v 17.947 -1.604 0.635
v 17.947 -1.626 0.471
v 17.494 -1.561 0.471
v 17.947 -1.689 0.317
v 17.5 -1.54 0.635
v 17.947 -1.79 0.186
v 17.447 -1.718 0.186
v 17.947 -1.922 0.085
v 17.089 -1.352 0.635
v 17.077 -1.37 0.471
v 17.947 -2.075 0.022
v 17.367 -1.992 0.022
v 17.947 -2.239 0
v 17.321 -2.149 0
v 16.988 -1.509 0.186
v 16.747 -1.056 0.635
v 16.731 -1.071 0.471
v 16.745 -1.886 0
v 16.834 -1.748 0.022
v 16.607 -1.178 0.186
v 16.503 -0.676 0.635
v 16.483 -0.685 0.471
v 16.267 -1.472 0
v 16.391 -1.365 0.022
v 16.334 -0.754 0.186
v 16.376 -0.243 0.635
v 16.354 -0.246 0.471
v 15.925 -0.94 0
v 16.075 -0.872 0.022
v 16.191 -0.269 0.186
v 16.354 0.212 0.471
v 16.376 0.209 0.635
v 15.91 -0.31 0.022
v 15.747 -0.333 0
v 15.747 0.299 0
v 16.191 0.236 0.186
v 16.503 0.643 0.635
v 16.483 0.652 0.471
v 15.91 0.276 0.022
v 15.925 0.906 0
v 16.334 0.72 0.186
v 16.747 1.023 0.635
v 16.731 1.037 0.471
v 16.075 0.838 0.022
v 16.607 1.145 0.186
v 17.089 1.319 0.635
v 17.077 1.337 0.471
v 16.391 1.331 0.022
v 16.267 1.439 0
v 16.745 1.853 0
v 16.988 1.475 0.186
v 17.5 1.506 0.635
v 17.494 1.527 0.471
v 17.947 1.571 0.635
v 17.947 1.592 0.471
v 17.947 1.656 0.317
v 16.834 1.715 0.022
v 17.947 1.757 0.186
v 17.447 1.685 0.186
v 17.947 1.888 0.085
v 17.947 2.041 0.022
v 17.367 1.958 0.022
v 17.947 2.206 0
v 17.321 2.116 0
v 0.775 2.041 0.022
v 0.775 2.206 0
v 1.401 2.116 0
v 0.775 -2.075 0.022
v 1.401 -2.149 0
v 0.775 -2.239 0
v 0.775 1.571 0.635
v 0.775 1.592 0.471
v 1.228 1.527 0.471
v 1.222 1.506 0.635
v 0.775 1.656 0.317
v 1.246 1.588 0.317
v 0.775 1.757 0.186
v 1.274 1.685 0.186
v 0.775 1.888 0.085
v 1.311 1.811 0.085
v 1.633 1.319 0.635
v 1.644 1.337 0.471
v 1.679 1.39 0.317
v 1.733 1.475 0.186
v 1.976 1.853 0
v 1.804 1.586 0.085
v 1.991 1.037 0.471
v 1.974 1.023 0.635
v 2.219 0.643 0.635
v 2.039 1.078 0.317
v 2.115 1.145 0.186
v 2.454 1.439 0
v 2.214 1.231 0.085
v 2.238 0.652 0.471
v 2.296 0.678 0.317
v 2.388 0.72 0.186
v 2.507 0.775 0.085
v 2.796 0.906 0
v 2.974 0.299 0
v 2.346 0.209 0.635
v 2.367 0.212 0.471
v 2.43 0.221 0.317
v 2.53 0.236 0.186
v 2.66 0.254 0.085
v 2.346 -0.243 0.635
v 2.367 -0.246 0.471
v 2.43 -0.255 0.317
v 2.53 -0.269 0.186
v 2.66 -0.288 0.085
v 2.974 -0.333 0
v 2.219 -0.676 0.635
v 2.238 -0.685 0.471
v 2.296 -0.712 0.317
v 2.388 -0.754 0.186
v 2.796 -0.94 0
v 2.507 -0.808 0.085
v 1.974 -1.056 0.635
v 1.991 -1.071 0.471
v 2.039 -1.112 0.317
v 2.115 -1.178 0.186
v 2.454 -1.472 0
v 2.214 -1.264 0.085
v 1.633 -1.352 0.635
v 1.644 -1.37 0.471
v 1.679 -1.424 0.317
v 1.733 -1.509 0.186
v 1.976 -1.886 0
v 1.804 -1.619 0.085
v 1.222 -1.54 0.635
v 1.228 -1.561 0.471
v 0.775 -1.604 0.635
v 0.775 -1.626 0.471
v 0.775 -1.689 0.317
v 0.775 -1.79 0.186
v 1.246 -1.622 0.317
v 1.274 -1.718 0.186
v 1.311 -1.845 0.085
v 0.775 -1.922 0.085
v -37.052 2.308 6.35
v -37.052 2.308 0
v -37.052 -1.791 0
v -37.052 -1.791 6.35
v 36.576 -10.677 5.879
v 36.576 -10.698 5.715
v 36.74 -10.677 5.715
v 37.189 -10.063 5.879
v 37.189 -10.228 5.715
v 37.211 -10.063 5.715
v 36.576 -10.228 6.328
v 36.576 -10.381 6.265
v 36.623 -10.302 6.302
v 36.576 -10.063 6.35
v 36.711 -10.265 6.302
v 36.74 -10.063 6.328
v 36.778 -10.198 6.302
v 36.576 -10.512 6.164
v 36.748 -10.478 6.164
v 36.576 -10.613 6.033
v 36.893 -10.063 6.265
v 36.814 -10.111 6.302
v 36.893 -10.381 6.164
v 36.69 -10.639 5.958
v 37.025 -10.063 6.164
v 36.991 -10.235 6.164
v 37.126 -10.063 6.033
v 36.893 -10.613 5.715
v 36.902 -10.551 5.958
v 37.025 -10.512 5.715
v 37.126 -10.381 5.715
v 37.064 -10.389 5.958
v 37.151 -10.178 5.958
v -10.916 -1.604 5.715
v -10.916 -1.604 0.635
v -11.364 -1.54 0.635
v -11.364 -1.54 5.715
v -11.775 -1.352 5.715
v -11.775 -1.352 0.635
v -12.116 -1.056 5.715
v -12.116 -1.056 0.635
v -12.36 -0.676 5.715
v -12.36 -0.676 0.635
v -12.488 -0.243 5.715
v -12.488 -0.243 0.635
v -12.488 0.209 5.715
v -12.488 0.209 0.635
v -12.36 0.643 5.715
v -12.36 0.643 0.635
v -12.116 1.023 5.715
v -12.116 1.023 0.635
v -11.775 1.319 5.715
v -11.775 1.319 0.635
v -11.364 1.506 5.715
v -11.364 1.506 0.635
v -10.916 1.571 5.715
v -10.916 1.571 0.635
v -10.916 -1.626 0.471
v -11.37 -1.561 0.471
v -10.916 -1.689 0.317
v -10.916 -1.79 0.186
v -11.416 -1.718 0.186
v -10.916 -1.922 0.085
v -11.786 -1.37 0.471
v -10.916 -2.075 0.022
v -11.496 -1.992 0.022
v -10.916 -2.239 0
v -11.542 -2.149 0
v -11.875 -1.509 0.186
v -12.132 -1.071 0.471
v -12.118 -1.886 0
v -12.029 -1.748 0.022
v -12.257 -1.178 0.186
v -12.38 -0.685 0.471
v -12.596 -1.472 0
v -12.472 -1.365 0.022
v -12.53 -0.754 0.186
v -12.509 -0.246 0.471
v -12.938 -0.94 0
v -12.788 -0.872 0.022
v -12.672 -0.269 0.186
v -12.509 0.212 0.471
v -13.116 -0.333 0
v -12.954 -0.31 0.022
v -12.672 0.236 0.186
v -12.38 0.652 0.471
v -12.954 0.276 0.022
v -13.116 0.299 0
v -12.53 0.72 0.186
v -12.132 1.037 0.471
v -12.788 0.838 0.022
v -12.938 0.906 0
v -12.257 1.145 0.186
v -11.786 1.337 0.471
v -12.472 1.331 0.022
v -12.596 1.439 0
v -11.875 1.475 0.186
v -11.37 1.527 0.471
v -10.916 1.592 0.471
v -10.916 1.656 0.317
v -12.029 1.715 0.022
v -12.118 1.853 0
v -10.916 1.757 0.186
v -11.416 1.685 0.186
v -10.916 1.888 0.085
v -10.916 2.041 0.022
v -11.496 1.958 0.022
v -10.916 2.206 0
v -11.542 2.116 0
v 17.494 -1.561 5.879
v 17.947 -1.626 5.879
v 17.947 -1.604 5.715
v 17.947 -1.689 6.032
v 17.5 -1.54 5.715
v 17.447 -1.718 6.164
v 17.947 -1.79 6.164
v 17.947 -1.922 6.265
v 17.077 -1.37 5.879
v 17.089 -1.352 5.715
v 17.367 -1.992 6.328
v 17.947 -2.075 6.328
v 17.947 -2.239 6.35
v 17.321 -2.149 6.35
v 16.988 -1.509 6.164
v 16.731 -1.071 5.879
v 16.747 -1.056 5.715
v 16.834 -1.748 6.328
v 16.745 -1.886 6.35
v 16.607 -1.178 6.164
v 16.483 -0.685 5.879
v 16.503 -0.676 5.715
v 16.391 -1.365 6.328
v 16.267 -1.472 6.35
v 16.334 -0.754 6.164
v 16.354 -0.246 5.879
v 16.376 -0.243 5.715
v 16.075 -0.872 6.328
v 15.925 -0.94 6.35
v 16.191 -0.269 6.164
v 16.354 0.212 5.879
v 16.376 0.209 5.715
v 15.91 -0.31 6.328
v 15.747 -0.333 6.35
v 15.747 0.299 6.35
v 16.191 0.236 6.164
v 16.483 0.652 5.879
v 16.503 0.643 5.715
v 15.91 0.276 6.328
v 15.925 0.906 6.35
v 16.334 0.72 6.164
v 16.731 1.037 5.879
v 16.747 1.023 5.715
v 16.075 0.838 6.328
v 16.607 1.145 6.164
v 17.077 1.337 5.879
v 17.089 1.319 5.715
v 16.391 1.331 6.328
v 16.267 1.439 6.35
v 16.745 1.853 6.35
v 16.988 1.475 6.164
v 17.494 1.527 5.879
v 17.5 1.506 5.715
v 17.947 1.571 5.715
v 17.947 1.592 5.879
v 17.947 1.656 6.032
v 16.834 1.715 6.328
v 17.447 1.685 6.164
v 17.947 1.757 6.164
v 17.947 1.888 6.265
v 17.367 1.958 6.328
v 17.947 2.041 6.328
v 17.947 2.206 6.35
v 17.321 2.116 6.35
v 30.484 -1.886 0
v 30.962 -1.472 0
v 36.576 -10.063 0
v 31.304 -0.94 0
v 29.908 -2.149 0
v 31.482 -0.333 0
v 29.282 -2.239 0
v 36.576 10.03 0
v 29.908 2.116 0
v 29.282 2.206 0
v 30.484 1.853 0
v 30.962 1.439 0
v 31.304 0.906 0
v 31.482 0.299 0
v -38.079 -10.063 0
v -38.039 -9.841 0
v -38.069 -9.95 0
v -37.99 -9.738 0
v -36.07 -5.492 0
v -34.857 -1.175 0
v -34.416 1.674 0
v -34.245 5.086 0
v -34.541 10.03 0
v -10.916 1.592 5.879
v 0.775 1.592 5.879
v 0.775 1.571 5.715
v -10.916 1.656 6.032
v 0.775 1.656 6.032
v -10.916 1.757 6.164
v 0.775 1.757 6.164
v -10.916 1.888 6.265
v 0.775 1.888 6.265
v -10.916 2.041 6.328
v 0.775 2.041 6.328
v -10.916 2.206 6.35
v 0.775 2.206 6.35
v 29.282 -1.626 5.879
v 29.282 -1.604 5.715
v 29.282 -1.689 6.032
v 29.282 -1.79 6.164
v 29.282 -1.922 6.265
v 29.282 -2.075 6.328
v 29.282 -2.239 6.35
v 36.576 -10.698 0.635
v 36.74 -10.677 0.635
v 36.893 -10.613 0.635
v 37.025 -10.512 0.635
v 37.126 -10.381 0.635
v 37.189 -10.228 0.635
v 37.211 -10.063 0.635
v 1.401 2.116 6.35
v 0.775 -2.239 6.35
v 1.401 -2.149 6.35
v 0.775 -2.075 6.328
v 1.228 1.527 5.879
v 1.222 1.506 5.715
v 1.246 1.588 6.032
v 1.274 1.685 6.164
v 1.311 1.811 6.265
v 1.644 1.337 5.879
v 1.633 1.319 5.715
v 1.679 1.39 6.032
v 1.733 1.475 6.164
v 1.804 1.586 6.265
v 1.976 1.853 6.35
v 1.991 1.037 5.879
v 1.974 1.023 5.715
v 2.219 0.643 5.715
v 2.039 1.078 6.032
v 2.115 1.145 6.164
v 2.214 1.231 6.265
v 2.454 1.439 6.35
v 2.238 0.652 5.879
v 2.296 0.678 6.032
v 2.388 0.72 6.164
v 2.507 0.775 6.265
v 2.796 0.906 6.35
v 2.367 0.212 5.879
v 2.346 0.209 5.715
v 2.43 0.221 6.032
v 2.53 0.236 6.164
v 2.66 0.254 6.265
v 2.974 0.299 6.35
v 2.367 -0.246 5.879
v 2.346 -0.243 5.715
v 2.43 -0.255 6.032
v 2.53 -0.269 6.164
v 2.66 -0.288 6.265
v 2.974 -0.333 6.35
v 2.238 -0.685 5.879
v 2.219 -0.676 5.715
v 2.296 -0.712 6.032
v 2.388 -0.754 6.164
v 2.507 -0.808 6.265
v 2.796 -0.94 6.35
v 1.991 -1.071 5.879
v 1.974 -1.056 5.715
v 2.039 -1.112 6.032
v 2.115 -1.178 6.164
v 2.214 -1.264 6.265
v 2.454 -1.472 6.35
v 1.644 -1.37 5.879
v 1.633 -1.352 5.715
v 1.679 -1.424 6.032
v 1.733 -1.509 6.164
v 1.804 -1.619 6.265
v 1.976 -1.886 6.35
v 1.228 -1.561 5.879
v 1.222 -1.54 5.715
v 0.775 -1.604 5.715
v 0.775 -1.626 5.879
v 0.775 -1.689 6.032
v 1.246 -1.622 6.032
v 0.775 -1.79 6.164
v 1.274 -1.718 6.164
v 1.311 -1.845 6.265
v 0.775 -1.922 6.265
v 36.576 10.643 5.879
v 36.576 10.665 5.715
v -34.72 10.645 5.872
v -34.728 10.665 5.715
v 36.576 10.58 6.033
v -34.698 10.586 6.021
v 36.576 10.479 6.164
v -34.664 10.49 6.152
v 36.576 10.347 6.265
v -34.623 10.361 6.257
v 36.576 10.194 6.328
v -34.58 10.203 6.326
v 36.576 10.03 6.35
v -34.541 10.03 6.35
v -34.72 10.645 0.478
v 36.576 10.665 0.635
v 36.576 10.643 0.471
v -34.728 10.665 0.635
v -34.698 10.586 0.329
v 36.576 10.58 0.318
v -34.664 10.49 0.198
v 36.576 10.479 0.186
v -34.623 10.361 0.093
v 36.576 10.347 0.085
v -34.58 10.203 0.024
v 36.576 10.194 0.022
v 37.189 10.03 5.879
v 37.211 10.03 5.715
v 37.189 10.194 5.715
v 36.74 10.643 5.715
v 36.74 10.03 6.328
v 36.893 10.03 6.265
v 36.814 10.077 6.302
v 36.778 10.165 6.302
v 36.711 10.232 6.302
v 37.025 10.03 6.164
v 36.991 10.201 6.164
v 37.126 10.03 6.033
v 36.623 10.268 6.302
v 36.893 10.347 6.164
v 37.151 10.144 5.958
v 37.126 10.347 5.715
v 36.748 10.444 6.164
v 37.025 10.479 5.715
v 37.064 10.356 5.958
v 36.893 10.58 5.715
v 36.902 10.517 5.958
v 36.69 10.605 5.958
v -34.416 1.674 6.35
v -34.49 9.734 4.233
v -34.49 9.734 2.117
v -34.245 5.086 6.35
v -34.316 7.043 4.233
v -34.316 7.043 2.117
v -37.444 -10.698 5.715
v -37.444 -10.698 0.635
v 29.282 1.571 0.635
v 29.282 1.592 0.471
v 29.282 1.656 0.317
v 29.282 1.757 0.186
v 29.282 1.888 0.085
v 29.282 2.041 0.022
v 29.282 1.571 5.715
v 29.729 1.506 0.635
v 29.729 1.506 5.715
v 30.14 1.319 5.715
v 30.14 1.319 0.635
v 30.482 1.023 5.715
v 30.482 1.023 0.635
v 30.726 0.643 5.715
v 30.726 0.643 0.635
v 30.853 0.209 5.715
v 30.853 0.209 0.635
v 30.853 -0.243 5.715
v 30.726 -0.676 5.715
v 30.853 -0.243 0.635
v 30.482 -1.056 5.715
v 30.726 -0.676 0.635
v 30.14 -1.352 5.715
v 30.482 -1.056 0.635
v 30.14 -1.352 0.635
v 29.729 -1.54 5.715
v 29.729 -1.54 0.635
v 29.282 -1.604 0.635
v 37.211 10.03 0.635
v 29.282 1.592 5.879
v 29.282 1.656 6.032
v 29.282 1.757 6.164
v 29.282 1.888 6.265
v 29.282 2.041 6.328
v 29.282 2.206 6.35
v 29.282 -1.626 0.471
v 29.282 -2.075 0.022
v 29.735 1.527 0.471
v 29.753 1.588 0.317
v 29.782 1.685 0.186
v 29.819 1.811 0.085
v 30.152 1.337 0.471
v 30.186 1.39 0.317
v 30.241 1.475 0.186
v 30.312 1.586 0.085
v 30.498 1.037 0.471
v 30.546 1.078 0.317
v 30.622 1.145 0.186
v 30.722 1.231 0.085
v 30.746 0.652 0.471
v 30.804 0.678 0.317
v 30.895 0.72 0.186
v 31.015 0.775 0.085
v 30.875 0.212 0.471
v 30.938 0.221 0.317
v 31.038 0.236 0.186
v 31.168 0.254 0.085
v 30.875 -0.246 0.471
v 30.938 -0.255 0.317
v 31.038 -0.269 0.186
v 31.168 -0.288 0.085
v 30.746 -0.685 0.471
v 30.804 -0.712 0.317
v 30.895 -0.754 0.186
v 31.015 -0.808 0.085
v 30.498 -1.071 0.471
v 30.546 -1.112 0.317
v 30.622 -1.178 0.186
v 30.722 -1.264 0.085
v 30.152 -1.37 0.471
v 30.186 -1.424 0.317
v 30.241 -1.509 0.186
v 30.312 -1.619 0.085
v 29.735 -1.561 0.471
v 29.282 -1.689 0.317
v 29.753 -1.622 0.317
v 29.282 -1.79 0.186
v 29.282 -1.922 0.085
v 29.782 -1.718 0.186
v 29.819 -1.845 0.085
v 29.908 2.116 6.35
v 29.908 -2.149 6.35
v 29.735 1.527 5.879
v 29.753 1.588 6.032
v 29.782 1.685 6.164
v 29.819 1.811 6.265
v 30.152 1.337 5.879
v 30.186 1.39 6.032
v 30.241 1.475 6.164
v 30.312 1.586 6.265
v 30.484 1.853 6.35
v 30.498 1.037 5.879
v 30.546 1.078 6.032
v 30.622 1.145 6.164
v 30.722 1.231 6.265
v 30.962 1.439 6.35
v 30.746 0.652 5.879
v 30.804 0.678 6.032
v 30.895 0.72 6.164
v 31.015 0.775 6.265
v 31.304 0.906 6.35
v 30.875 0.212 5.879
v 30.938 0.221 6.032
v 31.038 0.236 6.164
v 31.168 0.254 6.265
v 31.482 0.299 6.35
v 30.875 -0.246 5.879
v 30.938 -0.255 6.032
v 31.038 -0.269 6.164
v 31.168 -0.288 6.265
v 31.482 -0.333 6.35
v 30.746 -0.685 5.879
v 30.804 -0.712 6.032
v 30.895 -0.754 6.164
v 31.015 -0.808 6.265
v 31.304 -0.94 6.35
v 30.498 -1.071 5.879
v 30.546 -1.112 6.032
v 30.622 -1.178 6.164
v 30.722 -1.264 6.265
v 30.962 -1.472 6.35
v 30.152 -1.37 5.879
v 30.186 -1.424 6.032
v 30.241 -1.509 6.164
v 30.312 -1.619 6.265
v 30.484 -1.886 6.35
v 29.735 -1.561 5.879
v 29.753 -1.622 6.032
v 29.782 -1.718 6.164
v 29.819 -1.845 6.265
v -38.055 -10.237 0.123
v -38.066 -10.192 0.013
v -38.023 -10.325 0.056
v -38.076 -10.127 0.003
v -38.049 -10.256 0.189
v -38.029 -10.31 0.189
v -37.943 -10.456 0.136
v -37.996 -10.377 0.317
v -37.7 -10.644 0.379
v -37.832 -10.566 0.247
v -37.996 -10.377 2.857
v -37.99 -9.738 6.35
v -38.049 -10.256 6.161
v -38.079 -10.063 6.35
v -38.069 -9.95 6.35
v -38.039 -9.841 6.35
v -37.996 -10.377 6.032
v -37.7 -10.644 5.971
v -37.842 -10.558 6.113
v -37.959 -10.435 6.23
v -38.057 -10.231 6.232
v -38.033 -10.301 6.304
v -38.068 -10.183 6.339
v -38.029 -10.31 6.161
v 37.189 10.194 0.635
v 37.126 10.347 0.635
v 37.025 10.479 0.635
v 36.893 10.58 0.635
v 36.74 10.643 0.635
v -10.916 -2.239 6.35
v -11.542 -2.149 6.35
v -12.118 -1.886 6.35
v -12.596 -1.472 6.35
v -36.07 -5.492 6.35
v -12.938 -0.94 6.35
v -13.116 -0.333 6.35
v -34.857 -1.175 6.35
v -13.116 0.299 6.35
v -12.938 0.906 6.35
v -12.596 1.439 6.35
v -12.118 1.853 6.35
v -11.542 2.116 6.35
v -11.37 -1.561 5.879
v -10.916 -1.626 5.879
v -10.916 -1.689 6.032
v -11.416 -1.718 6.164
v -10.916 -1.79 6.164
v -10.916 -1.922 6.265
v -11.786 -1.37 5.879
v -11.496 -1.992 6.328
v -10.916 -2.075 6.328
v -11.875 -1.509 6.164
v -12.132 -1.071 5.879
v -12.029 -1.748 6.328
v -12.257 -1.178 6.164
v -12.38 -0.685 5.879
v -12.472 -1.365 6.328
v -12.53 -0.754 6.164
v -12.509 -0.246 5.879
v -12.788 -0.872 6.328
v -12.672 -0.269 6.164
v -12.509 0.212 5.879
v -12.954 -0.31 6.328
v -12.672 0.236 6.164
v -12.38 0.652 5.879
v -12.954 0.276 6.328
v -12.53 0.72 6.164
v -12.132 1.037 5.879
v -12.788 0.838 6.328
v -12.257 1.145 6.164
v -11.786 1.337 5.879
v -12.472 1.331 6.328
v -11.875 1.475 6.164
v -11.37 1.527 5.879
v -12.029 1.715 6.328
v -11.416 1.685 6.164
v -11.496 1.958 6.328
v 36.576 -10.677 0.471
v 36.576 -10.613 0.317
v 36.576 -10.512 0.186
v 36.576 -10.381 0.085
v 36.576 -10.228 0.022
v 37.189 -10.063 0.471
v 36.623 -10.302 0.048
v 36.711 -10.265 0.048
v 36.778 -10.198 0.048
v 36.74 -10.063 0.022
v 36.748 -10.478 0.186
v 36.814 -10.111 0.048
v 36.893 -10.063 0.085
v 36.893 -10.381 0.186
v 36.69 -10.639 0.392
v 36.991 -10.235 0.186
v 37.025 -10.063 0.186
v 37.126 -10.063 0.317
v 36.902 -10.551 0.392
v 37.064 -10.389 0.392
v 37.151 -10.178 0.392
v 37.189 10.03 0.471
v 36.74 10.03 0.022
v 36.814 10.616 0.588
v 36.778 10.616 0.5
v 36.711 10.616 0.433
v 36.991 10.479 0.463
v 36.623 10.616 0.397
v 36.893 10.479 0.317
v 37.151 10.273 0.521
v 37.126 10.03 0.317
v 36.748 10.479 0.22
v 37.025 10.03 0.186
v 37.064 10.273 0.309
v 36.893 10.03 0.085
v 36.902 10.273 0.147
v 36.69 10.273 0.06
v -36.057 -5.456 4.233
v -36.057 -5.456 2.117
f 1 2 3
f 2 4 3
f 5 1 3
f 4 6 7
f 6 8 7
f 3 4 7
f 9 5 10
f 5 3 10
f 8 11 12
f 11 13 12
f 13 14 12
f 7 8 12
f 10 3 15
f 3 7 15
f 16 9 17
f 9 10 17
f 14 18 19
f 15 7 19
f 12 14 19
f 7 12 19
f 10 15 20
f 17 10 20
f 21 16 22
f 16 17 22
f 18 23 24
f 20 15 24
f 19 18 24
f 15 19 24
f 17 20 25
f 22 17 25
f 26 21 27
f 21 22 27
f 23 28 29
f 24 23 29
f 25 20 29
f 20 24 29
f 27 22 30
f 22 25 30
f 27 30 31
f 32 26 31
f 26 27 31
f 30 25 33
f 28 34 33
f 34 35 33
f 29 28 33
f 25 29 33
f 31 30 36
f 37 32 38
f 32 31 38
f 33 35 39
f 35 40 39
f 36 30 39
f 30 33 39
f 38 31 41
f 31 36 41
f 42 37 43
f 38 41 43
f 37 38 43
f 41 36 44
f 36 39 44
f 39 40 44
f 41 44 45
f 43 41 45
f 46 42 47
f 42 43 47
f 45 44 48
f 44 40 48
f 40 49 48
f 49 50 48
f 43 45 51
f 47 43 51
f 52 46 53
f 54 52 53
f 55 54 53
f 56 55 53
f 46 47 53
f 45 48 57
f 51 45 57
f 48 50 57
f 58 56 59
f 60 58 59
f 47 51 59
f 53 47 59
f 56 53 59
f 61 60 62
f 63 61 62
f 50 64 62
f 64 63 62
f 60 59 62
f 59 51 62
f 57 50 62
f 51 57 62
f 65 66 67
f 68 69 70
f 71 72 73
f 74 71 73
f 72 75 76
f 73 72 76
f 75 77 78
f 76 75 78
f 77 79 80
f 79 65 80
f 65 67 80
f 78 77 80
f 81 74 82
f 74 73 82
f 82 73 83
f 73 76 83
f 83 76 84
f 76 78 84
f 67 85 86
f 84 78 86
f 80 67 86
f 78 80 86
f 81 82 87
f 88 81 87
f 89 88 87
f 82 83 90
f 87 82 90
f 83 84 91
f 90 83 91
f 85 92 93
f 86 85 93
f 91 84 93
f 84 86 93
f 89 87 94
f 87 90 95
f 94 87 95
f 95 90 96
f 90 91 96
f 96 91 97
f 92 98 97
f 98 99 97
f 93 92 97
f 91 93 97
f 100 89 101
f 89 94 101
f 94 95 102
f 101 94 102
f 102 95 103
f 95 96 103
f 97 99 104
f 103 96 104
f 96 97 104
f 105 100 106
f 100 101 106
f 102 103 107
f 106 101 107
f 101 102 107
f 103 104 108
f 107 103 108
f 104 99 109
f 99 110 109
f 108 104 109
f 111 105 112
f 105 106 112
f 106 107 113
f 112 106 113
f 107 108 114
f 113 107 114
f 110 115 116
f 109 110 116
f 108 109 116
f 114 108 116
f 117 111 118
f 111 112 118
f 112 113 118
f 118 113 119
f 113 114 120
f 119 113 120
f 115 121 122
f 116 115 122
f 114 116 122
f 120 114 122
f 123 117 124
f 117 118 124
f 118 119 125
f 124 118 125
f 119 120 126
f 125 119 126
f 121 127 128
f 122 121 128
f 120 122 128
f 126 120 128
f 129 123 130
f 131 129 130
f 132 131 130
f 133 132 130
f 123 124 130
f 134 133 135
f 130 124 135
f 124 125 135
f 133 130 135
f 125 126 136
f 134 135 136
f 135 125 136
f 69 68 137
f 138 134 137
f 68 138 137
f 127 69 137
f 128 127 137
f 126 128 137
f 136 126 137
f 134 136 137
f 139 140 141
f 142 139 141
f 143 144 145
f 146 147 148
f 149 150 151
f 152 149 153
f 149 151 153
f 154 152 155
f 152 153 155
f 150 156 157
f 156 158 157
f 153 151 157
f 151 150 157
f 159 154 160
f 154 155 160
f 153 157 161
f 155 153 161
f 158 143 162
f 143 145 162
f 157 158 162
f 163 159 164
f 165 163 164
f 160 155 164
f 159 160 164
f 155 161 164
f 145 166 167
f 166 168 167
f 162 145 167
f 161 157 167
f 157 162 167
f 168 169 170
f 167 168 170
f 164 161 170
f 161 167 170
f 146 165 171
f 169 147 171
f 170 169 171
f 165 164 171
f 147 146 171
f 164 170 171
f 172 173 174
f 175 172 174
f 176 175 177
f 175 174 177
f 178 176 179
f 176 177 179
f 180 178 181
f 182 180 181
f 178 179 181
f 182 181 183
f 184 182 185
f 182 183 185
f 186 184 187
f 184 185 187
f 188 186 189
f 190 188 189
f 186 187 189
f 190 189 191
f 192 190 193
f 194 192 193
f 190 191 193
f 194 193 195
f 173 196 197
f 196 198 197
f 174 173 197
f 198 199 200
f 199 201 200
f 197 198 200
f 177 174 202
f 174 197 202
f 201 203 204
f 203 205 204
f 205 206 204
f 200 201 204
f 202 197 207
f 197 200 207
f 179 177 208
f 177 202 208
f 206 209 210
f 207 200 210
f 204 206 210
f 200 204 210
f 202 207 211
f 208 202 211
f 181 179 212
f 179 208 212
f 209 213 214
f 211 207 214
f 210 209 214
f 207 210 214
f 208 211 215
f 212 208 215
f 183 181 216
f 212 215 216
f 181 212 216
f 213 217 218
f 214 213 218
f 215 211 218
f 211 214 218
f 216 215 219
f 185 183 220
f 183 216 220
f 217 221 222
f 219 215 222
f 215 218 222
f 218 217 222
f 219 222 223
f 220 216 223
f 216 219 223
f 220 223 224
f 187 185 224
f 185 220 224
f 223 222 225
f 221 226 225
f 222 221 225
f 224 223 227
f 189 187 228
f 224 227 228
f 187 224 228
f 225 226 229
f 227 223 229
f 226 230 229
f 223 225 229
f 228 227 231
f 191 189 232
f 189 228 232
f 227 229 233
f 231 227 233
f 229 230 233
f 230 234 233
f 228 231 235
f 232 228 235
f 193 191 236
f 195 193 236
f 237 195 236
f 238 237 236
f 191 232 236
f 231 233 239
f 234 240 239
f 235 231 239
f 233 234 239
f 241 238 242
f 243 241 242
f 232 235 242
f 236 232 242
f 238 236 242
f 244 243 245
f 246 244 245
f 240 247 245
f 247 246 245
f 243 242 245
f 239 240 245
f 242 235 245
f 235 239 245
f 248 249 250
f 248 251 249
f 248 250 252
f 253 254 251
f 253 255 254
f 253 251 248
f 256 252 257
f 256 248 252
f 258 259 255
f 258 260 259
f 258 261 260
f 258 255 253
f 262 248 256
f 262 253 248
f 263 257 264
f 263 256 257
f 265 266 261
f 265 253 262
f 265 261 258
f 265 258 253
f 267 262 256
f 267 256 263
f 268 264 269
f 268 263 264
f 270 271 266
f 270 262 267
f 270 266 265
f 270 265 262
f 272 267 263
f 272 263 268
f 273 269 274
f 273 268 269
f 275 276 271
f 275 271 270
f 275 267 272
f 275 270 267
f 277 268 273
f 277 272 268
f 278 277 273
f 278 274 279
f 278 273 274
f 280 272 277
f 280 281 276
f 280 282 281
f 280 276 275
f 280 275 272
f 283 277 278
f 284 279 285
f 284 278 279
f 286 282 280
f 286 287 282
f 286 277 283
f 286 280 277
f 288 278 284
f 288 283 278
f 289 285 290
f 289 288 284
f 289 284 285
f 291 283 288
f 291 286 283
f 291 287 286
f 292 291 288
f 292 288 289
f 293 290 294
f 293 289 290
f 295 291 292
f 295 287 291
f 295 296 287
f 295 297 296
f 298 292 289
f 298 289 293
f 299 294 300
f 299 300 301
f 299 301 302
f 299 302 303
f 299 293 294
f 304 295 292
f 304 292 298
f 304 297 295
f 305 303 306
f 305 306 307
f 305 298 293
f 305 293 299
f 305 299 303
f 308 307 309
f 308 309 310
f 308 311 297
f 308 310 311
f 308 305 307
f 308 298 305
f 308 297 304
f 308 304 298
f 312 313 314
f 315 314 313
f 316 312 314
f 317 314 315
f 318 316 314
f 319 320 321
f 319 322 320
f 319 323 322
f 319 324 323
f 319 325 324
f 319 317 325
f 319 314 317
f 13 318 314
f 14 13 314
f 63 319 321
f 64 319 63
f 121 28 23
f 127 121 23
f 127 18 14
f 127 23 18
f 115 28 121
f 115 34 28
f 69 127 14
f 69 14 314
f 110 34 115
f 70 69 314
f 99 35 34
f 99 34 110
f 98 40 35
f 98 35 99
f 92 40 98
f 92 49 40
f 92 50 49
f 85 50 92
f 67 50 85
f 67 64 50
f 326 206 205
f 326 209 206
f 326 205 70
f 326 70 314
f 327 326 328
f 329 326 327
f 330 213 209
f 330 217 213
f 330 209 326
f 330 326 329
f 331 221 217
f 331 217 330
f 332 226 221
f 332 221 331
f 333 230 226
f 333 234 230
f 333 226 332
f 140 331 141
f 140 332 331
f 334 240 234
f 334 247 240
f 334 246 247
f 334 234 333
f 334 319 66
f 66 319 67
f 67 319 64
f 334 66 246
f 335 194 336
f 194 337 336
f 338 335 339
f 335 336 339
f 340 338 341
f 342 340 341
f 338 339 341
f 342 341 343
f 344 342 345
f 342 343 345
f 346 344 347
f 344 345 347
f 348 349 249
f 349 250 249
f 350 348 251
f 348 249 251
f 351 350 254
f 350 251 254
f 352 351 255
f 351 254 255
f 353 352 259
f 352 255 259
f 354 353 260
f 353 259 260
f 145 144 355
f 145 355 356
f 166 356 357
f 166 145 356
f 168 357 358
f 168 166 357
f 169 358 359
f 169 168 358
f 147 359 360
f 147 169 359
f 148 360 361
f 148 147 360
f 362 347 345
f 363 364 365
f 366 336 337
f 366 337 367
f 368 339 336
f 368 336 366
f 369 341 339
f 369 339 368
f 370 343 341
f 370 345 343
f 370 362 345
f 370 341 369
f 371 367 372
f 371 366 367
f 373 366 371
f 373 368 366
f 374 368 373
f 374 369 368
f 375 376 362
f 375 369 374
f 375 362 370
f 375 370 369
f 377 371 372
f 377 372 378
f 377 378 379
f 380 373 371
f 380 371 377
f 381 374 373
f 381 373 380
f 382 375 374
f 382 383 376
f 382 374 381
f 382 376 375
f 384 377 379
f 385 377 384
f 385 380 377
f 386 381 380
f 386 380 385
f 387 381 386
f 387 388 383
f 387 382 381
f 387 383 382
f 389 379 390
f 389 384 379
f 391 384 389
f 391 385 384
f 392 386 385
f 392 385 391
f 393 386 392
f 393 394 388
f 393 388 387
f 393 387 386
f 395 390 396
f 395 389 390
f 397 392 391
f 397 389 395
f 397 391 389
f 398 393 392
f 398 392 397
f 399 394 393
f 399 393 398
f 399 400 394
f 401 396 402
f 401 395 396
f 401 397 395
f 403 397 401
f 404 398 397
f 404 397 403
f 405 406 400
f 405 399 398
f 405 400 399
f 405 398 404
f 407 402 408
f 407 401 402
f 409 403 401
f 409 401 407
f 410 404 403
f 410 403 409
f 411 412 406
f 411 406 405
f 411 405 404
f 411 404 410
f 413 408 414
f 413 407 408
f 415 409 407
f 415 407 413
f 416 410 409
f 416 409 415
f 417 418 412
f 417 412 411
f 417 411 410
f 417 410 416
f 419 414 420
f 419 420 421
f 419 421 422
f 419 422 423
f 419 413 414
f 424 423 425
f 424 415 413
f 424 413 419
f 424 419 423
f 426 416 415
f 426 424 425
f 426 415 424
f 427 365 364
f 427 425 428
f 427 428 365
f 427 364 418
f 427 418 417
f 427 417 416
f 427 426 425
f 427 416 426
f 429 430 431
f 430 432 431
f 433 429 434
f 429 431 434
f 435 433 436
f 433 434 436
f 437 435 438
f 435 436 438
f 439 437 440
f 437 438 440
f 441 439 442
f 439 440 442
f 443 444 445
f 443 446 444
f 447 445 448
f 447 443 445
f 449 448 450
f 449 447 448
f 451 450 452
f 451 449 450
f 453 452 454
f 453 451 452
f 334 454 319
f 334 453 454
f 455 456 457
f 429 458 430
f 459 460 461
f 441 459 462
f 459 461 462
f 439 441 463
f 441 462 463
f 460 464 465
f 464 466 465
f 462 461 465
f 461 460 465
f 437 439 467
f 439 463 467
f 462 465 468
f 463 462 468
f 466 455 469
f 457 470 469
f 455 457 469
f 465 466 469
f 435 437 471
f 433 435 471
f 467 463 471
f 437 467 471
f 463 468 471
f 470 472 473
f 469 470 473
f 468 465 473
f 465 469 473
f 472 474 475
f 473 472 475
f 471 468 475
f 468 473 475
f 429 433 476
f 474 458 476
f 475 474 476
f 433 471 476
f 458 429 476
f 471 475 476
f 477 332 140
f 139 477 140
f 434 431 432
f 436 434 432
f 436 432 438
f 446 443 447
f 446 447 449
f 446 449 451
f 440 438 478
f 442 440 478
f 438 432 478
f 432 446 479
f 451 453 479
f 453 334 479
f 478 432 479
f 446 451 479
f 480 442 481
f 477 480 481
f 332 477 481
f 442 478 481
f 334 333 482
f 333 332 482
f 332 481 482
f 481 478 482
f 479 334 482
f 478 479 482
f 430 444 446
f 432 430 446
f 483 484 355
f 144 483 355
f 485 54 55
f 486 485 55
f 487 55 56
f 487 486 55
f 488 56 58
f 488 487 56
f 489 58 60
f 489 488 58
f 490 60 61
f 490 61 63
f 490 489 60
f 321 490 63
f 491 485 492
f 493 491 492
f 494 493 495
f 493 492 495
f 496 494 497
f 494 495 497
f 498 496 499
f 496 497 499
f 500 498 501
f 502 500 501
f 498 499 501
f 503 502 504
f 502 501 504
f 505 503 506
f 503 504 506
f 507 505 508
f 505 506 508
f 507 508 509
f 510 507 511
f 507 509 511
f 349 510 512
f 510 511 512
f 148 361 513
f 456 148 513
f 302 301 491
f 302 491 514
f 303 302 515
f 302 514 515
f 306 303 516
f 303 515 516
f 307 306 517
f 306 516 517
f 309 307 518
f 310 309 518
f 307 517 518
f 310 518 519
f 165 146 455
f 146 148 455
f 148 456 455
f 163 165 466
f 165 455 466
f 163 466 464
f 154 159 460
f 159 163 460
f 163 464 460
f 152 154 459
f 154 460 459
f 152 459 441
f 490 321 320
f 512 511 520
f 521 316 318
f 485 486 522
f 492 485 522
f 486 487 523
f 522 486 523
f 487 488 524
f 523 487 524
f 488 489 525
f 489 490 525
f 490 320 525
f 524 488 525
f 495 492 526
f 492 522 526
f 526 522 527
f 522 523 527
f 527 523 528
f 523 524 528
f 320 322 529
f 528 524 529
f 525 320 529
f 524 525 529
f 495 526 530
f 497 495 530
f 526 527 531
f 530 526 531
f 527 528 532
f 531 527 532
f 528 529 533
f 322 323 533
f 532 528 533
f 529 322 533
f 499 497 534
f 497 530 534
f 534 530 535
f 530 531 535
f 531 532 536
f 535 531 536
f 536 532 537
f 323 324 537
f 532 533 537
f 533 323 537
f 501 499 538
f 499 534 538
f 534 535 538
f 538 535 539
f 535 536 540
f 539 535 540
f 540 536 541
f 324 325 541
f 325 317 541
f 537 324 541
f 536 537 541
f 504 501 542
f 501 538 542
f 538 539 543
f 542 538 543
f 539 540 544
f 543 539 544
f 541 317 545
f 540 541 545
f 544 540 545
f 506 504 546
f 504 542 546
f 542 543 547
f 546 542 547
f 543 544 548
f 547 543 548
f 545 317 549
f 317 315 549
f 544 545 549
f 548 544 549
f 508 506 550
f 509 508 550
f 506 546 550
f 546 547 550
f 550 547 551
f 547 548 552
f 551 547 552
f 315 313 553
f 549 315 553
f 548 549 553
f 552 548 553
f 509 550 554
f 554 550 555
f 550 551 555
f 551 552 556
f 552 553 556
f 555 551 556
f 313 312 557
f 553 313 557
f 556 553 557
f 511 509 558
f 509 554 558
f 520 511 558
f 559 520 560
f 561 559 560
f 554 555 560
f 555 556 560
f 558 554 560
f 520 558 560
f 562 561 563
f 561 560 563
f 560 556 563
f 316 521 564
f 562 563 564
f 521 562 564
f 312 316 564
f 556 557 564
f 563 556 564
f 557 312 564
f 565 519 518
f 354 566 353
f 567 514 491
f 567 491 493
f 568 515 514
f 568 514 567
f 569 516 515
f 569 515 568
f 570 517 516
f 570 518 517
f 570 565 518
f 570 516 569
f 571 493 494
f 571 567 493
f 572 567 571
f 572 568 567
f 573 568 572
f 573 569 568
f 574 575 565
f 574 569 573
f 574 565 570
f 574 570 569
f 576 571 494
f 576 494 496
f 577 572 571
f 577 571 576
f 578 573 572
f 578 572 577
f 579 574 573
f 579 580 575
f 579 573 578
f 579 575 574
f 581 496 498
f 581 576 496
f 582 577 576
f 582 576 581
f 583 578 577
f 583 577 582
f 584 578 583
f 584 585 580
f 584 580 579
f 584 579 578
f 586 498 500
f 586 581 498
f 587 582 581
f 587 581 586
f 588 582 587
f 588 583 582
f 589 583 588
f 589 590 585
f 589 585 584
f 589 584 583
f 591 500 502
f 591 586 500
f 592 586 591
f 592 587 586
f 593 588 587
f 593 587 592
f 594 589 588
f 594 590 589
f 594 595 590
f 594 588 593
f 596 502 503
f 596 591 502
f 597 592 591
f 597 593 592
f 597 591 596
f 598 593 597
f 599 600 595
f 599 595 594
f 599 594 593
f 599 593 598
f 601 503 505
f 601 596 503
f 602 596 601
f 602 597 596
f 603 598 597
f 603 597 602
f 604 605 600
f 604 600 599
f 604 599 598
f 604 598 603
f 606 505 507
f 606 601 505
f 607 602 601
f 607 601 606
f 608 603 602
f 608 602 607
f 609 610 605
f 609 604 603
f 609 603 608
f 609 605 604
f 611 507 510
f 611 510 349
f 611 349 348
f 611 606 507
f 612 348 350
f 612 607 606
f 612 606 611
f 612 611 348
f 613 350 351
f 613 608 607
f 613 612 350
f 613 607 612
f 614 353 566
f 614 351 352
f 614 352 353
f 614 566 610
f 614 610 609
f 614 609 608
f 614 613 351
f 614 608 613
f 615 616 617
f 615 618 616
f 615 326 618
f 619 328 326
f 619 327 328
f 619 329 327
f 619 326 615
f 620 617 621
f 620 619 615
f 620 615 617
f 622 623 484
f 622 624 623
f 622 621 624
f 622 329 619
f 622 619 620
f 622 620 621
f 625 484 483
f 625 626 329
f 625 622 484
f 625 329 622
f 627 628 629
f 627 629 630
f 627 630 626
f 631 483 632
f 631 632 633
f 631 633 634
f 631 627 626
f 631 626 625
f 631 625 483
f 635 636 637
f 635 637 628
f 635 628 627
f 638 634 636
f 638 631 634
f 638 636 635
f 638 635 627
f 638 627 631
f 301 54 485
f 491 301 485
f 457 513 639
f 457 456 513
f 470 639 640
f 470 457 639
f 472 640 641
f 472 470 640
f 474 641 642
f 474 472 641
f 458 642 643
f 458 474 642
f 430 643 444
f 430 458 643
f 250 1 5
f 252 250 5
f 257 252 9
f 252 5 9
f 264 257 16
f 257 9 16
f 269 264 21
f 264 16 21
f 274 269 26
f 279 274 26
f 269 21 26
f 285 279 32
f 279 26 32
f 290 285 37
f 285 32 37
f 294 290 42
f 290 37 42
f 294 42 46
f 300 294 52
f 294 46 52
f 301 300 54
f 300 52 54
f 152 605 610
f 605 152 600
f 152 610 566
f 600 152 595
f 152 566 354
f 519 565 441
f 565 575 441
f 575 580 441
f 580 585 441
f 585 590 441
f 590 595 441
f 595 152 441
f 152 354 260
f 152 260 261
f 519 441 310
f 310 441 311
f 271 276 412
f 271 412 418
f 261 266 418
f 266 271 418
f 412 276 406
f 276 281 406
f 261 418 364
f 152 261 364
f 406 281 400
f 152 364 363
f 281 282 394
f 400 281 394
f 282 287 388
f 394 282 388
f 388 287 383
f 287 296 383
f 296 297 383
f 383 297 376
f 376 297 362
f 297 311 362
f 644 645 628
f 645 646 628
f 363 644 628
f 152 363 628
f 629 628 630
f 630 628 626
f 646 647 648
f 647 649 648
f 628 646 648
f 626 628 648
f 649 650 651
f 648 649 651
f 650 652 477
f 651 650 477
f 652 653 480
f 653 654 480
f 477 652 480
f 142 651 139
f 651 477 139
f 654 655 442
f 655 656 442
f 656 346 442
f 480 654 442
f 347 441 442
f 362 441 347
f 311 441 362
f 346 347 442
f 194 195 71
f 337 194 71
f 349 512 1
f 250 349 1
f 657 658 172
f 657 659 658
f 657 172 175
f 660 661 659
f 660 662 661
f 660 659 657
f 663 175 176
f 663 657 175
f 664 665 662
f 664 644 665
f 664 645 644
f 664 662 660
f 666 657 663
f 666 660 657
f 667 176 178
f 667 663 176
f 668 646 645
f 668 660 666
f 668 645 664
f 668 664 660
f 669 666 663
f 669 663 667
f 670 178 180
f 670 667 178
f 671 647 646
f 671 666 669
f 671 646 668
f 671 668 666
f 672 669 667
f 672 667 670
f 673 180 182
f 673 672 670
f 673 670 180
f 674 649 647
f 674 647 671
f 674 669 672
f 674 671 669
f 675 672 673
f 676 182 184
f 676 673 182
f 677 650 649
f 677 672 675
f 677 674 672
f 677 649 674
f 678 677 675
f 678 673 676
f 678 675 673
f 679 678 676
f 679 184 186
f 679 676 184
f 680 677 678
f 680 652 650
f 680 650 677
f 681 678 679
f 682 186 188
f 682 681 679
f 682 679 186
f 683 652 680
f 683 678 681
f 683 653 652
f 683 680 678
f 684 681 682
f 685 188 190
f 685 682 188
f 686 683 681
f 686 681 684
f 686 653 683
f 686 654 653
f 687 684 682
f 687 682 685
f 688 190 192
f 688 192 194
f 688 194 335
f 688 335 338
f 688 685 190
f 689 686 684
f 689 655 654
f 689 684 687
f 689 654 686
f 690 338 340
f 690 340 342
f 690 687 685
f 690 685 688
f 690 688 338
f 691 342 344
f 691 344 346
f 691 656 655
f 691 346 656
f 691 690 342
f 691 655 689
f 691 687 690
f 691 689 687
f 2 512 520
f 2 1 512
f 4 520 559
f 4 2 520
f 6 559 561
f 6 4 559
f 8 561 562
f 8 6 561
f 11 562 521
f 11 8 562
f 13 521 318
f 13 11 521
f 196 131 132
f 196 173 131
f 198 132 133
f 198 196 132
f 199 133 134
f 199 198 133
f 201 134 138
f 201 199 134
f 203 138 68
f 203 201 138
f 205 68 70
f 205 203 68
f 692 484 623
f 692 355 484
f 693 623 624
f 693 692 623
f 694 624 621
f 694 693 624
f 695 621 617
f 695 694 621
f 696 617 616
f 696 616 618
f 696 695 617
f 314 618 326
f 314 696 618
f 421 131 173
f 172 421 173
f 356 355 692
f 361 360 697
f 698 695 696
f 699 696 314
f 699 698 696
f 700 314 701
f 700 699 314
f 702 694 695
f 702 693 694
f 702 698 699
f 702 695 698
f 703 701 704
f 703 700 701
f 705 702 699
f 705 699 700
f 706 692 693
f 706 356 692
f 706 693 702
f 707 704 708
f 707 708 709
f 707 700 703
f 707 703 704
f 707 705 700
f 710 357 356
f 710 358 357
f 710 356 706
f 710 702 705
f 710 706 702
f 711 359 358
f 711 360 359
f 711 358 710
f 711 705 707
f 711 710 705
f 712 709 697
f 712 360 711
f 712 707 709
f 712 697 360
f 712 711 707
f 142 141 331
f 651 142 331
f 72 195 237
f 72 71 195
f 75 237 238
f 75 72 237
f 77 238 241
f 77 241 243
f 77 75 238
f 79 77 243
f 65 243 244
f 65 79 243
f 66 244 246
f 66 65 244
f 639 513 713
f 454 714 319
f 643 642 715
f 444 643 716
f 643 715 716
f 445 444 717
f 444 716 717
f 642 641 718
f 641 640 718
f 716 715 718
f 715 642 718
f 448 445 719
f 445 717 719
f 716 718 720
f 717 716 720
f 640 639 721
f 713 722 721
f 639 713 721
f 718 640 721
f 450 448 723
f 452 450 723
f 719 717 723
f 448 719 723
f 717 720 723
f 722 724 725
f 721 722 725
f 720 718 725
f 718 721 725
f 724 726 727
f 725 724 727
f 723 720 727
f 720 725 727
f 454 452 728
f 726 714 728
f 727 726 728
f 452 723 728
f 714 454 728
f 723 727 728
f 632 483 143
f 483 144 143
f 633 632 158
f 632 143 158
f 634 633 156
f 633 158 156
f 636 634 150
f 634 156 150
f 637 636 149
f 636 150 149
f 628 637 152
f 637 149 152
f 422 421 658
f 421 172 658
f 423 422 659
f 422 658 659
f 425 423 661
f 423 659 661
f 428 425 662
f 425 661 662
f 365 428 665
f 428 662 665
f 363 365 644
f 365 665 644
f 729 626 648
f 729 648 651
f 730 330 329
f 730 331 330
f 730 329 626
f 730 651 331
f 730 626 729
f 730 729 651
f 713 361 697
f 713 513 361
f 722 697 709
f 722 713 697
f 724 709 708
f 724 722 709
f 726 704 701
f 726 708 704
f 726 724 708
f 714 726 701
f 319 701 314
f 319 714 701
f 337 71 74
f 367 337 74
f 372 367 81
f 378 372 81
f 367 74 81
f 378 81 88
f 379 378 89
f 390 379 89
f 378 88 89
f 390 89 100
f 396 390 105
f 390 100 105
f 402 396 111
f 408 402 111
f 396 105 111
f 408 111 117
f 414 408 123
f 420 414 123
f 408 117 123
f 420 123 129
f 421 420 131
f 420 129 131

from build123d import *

# Parameters (mm, degrees)
F1_DEPTH = 6.35
F2_R     = 0.635


with BuildPart() as f1:
    # F0 (on Top) → F1 (new body)
    with BuildSketch(Plane.XY):
        with BuildLine():
            add(Edge.make_bspline(
                [(-38.9891895168, -10.6982229425), (-38.3465920283, -10.3074894534), (-37.8422569059, -9.6253746617), (-35.8621994283, -5.3779231667), (-35.1209965892, -2.4292102932), (-34.8568920019, -1.175043316)],
                knots=[0, 0, 0, 0, 0.2324380402, 0.6162190201, 1, 1, 1, 1], degree=3))
            Line((-38.9891895168, -10.6982229425), (37.2108104832, -10.6982229425))
            Line((37.2108104832, -10.6982229425), (37.2108104832, 10.6646132435))
            Line((37.2108104832, 10.6646132435), (-34.7275388503, 10.6646132435))
            add(Edge.make_bspline(
                [(-34.7275388503, 10.6646132435), (-34.6275926151, 10.4093259266), (-34.4118404297, 9.6572574945), (-34.3207970154, 6.7101610318), (-34.149913299, 3.9386656499), (-34.416114208, 1.6737423804)],
                knots=[0, 0, 0, 0, 0.1984555205, 0.5308860218, 1, 1, 1, 1], degree=3))
            Line((-34.416114208, 1.6737423804), (-37.0515519649, 2.308008018))
            Line((-37.0515519649, 2.308008018), (-37.0515519649, -1.7913987552))
            Line((-37.0515519649, -1.7913987552), (-34.8568920019, -1.175043316))
        make_face()
        with BuildLine():
            Line((0.7745096379, -1.6043048495), (-10.9163193113, -1.6043048495))
            ThreePointArc((-10.9163193113, -1.6043048495), (-12.5038193113, -0.0168048495), (-10.9163193113, 1.5706951505))
            Line((-10.9163193113, 1.5706951505), (0.7745096379, 1.5706951505))
            ThreePointArc((0.7745096379, 1.5706951505), (2.3620096379, -0.0168048495), (0.7745096379, -1.6043048495))
        make_face(mode=Mode.SUBTRACT)
        with BuildLine():
            Line((29.2821446352, -1.6043048495), (17.9468611174, -1.6043048495))
            ThreePointArc((17.9468611174, -1.6043048495), (16.3593611174, -0.0168048495), (17.9468611174, 1.5706951505))
            Line((17.9468611174, 1.5706951505), (29.2821446352, 1.5706951505))
            ThreePointArc((29.2821446352, 1.5706951505), (30.8696446352, -0.0168048495), (29.2821446352, -1.6043048495))
        make_face(mode=Mode.SUBTRACT)
    extrude(amount=F1_DEPTH)

    # F2
    f2_edges = [f1.edges().sort_by_distance(p)[0] for p in [
        (37.21081, -10.698223, 3.175),
        (-38.98919, -10.698223, 3.175),
        (-0.88919, -10.698223, 0),
        (-0.88919, -10.698223, 6.35),
        (37.21081, -0.016805, 0),
        (37.21081, 10.664613, 3.175),
        (37.21081, -0.016805, 6.35),
        (1.241636, 10.664613, 6.35),
        (1.241636, 10.664613, 0),
        (-10.916319, 1.570695, 3.175),
        (0.77451, 1.570695, 3.175),
        (-5.070905, 1.570695, 0),
        (-5.070905, 1.570695, 6.35),
        (17.946861, 1.570695, 3.175),
        (29.282145, 1.570695, 3.175),
        (23.614503, 1.570695, 0),
        (23.614503, 1.570695, 6.35),
    ]]
    fillet(f2_edges, radius=F2_R)


solid = f1.part
